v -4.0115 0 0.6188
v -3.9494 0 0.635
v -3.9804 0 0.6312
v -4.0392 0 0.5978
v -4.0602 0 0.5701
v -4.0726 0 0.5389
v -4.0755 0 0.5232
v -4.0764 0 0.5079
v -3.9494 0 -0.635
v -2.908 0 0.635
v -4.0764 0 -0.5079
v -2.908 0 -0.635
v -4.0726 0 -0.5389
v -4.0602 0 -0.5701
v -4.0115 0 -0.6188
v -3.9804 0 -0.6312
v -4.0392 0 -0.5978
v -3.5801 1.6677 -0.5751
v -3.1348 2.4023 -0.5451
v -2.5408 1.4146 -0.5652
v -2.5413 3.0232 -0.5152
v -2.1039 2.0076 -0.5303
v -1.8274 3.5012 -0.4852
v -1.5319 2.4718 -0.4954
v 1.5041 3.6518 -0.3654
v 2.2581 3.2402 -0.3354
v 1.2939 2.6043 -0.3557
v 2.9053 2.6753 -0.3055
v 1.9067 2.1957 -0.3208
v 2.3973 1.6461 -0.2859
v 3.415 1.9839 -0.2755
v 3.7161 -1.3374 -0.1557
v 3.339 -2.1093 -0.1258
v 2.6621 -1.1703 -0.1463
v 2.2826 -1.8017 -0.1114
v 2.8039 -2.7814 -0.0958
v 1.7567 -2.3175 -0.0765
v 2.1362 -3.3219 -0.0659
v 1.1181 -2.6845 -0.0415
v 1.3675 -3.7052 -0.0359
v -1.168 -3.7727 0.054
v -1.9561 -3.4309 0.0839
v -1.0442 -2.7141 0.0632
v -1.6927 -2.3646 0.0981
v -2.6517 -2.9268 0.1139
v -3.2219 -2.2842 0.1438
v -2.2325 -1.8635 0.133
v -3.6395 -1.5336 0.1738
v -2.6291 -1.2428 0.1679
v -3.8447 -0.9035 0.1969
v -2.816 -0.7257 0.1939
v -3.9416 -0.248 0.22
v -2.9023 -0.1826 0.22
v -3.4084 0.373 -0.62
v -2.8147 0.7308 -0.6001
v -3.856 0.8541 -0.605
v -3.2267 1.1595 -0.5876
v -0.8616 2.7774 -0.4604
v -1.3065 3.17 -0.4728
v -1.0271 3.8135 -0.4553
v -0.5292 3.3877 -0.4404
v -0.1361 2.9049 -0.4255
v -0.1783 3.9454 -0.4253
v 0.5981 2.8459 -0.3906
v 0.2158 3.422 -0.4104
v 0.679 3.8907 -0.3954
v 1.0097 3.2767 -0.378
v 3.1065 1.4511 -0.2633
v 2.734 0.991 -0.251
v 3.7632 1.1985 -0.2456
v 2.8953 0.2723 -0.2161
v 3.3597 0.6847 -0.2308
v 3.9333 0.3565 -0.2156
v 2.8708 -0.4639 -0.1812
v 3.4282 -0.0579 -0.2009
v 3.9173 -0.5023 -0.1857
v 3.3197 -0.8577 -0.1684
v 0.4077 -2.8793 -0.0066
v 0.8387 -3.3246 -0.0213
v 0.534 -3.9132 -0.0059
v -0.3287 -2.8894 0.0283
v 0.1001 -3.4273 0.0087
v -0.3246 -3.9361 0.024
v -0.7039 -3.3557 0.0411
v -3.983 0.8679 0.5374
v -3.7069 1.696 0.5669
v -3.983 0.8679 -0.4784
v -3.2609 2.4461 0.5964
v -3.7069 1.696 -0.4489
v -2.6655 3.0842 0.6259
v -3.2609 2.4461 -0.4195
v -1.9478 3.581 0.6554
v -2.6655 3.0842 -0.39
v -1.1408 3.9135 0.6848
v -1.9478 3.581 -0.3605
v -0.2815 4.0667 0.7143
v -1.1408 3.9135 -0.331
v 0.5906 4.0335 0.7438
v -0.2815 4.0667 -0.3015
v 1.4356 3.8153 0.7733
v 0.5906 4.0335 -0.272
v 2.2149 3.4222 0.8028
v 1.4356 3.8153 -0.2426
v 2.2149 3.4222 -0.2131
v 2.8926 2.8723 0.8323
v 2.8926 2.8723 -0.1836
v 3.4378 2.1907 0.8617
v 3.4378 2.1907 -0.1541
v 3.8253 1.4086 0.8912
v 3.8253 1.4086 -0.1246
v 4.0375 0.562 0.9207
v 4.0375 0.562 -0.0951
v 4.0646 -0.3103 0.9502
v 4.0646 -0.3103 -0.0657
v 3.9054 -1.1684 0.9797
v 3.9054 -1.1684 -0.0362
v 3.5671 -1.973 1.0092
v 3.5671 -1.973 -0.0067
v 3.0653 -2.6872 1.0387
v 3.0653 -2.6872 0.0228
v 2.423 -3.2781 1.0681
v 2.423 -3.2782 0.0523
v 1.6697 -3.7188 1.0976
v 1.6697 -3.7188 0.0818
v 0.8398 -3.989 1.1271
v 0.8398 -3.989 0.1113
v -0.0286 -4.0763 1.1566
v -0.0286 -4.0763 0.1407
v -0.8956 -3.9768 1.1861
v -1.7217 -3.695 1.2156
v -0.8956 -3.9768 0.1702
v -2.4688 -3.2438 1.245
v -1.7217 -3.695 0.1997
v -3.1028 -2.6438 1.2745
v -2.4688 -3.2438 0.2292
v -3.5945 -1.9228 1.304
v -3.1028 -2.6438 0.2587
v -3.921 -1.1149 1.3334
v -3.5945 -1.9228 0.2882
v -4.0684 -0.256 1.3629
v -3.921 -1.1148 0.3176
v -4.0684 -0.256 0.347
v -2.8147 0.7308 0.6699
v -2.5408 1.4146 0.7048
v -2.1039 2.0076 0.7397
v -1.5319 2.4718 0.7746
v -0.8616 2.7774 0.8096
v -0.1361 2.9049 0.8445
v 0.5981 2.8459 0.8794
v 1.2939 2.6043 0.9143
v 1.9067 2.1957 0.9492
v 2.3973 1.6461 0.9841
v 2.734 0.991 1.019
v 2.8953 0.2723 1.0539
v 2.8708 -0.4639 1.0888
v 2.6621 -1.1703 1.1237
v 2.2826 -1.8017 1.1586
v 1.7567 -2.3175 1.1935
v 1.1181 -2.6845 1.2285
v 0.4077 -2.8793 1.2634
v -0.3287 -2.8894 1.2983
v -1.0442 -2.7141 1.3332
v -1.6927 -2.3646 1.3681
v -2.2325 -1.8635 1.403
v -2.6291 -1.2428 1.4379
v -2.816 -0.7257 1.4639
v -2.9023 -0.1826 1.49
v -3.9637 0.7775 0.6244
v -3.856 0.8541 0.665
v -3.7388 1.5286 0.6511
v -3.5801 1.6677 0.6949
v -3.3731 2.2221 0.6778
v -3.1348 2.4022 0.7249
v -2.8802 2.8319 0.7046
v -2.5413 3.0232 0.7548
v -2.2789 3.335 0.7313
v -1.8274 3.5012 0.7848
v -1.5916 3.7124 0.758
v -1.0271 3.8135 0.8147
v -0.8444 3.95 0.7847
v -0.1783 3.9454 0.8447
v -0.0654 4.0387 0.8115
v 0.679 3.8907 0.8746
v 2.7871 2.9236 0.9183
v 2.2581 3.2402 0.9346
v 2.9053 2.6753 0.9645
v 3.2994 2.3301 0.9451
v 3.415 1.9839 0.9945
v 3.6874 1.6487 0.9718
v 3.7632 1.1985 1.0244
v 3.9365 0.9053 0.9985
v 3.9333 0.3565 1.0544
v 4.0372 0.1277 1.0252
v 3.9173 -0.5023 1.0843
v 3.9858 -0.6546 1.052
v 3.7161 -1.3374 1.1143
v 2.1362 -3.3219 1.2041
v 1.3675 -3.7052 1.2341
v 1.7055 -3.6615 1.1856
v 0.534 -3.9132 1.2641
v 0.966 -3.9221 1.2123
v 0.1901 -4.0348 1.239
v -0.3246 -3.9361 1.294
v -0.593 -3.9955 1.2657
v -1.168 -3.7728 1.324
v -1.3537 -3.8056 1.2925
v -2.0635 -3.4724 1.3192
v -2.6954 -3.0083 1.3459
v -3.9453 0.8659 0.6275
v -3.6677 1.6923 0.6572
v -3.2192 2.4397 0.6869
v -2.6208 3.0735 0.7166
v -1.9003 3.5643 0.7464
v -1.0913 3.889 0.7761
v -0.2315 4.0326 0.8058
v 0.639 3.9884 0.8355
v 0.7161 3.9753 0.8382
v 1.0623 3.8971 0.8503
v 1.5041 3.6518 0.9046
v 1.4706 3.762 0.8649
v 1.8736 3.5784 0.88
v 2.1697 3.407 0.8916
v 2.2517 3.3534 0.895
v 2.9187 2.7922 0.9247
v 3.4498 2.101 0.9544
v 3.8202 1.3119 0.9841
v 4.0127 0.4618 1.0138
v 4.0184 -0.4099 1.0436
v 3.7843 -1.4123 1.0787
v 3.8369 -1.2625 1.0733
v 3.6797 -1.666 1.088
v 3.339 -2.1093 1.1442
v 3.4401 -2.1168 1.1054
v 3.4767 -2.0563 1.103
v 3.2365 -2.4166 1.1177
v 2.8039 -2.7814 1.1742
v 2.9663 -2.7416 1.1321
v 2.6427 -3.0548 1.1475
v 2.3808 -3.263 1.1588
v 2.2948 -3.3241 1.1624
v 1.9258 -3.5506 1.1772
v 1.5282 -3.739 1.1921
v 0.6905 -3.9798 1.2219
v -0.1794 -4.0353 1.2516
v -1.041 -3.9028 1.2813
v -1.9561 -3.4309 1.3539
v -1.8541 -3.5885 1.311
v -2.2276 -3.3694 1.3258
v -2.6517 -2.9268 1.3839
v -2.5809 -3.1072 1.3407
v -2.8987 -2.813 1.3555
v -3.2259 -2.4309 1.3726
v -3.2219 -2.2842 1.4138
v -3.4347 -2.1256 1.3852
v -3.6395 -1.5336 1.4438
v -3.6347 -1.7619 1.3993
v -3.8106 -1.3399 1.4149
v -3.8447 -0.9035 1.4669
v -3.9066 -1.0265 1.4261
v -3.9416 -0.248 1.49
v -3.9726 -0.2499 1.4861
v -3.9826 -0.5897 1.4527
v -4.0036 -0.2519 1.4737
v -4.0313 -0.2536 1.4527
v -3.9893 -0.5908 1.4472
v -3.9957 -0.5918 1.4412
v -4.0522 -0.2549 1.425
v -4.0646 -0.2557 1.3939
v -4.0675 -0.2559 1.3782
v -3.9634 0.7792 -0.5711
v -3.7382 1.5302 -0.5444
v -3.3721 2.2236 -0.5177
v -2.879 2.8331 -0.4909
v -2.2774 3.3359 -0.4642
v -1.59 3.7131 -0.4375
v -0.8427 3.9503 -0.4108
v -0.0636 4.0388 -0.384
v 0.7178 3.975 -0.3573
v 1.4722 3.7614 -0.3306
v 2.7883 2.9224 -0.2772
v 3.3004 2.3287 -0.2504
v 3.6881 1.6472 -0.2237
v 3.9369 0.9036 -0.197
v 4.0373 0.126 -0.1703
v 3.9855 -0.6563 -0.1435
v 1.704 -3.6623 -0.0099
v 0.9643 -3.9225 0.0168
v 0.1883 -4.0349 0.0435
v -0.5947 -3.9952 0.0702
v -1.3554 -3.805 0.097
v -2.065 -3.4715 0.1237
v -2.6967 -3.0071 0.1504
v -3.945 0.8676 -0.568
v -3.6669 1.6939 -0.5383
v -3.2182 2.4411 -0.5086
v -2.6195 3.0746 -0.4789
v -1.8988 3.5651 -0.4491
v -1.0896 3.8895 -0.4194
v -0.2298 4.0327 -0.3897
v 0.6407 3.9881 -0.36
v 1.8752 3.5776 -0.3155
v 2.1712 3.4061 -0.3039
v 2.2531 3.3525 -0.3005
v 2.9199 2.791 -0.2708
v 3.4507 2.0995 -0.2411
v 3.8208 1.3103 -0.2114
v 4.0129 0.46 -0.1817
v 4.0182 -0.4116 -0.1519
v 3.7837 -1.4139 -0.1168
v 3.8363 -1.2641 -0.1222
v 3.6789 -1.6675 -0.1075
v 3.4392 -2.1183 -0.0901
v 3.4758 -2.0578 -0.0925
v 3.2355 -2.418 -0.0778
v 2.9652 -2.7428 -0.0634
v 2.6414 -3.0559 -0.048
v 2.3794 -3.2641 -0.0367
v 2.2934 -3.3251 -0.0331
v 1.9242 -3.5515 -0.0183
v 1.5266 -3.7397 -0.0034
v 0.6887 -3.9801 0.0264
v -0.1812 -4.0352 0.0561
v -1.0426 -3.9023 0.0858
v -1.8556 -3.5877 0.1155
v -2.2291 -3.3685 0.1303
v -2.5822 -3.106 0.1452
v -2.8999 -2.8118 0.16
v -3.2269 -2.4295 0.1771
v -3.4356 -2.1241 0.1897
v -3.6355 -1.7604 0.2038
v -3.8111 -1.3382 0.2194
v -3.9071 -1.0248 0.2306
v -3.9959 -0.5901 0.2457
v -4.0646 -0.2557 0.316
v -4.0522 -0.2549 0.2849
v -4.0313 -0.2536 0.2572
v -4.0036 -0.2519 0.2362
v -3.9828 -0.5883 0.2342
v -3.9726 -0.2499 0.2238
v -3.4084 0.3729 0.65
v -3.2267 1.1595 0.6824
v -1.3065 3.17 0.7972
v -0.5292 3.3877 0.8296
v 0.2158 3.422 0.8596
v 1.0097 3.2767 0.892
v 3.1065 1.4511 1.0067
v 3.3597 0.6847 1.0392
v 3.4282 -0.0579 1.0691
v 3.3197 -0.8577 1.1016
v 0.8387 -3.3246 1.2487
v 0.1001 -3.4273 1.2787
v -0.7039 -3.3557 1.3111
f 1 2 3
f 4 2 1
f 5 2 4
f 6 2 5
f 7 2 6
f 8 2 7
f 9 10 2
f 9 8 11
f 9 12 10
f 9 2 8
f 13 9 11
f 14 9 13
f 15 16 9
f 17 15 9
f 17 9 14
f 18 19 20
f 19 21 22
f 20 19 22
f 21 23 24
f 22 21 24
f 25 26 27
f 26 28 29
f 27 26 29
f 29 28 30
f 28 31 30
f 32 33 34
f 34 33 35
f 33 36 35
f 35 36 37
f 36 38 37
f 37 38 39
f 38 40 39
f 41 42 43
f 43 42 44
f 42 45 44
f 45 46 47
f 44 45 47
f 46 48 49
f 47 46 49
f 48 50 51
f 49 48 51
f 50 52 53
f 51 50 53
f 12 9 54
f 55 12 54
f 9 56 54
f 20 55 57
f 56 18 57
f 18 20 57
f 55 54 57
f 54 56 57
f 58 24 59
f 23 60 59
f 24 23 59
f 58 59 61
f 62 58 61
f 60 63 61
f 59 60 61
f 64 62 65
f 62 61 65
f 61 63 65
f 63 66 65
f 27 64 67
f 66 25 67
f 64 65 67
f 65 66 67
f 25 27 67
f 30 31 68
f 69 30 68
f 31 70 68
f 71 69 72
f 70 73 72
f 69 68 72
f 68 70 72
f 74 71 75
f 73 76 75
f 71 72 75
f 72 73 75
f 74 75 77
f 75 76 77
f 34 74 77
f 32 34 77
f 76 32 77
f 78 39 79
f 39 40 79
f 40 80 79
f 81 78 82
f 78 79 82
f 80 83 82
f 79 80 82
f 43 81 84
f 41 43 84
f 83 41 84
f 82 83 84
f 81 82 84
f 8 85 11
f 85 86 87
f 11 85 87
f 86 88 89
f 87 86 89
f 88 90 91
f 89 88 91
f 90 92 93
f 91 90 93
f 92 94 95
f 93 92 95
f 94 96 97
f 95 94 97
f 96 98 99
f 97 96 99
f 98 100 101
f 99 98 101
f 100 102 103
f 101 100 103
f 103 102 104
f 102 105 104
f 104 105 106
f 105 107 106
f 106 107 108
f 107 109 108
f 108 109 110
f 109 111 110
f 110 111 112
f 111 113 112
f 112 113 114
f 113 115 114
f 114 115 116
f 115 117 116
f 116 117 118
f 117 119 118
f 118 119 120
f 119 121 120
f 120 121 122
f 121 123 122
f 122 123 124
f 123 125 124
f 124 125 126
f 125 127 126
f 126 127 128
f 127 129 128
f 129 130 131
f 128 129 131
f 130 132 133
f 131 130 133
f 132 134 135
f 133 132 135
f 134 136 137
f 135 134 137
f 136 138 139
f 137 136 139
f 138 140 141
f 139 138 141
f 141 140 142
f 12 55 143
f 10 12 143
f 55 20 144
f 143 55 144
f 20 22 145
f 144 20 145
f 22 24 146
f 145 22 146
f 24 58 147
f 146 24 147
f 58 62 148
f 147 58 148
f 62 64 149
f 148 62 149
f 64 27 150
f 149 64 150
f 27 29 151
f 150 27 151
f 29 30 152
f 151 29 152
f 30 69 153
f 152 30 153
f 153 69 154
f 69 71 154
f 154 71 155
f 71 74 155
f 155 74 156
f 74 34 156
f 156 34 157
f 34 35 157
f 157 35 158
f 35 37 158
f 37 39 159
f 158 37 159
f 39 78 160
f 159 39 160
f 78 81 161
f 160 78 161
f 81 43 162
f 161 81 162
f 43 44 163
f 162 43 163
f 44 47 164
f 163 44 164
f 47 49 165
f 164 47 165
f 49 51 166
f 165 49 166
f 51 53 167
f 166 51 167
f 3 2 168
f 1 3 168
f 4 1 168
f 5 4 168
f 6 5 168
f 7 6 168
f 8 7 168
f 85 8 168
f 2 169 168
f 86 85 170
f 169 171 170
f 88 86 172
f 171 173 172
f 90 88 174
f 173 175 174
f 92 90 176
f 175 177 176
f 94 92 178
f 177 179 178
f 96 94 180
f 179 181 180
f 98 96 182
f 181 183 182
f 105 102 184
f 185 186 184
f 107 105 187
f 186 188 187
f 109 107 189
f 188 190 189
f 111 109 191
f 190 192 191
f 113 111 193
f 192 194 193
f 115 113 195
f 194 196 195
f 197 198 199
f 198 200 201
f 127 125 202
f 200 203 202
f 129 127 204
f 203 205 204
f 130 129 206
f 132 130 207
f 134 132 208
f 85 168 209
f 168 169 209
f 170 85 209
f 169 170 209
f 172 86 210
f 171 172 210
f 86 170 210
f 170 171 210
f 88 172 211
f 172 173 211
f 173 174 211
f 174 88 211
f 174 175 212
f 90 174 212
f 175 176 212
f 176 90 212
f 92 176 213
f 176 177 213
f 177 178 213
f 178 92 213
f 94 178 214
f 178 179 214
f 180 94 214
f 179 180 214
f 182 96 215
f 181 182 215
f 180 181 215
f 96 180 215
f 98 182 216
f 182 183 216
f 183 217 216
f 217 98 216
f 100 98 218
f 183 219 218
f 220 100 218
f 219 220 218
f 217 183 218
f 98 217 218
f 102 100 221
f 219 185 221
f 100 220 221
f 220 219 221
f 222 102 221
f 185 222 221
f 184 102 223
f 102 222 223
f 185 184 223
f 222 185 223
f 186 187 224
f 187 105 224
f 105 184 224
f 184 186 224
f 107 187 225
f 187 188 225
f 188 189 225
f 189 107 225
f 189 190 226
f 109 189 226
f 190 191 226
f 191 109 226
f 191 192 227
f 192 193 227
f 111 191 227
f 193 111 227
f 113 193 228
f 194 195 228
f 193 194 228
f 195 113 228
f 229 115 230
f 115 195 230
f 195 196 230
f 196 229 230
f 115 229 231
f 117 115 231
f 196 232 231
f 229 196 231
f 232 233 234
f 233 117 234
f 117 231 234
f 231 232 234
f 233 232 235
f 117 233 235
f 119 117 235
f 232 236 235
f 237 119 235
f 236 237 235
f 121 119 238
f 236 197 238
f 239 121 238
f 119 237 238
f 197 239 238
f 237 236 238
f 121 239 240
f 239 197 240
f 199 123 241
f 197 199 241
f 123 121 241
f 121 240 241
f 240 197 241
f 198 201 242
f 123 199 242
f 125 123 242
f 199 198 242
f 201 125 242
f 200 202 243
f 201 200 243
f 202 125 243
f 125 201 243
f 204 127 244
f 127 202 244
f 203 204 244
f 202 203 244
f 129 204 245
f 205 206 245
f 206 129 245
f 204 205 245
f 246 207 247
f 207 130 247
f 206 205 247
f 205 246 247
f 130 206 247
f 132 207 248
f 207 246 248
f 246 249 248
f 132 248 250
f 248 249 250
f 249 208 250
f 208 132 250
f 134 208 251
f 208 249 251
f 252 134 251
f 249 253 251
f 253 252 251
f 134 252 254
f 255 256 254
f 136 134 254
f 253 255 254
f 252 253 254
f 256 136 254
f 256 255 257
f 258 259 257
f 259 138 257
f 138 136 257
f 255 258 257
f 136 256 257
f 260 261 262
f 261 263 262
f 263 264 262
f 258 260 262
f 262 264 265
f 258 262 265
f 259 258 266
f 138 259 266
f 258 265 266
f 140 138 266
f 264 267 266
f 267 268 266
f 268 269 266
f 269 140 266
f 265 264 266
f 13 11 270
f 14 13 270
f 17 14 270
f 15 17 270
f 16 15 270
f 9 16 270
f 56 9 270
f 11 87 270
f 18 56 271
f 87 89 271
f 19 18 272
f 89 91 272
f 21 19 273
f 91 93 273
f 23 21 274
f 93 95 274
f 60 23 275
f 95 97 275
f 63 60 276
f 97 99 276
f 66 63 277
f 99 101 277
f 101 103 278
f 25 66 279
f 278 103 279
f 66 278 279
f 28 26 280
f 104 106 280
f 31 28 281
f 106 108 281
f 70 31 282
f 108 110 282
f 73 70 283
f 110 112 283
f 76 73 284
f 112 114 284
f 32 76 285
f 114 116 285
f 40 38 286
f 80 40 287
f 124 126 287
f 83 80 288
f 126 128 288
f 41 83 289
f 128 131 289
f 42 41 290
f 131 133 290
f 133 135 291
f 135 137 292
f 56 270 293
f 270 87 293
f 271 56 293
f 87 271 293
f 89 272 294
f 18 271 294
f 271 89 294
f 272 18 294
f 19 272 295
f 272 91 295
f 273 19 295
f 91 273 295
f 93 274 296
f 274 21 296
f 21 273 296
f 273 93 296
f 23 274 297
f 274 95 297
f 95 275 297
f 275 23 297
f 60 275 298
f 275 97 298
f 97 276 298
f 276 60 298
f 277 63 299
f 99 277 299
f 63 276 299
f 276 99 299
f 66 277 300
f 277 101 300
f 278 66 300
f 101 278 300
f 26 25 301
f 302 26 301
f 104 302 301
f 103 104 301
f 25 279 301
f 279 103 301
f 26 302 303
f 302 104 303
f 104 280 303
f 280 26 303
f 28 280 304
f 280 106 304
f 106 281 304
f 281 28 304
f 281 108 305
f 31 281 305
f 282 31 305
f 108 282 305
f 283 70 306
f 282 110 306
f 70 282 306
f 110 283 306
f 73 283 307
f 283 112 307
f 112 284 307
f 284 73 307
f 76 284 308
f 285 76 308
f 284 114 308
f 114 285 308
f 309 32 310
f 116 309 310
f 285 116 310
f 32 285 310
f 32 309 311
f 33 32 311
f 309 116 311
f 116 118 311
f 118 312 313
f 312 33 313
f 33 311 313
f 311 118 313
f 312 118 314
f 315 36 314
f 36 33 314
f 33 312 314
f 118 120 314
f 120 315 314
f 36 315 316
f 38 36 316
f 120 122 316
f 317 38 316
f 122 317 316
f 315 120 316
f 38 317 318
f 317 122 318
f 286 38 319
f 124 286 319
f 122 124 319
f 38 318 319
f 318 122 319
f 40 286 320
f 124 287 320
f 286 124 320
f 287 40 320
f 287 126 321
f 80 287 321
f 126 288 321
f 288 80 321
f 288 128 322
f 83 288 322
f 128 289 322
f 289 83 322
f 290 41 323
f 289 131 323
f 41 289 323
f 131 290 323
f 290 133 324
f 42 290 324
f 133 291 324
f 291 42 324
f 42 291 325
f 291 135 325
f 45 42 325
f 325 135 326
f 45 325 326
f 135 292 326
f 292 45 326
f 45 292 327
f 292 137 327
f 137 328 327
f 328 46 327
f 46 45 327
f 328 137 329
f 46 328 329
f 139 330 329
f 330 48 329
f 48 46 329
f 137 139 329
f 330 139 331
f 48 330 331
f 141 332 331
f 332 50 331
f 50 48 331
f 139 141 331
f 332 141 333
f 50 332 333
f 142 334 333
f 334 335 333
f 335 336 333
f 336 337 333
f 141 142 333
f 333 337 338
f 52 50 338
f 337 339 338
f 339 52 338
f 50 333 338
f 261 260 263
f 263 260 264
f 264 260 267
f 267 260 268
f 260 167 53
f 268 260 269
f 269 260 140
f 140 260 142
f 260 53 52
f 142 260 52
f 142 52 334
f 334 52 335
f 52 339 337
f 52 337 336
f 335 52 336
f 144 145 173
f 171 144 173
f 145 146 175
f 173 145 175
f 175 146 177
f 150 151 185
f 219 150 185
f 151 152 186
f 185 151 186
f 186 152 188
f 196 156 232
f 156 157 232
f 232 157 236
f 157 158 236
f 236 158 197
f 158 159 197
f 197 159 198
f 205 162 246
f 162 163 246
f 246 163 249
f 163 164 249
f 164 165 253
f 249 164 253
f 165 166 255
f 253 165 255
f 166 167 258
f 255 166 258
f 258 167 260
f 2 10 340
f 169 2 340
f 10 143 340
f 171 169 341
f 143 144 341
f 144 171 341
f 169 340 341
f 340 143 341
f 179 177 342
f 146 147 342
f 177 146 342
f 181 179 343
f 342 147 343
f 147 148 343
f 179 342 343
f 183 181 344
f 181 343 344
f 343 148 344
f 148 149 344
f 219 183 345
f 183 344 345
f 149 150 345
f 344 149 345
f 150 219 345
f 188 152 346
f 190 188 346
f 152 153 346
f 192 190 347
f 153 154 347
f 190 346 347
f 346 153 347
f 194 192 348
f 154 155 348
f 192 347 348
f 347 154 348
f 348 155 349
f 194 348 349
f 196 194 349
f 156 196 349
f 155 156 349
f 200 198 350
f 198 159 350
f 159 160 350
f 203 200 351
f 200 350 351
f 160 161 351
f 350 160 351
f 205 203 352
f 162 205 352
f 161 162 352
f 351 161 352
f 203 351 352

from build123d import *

# Parameters (mm, degrees)
SWEEP3_PITCH       = 0.8636
SWEEP3_HEIGHT      = 0.854964
SWEEP3_RADIUS      = 3.4925
SWEEP3_START_ANGLE = -180
SKETCH2_W          = 1.1684
SKETCH2_H          = 1.27
FILLET1_R          = 0.127


with BuildPart() as part:
    # Sweep3: sweep along a helix
    with BuildLine() as sweep3_path:
        add(Helix(SWEEP3_PITCH, SWEEP3_HEIGHT, SWEEP3_RADIUS, center=(0, 0, 0), direction=(0, 0, 1), lefthand=True, mode=Mode.PRIVATE).rotate(Axis((0, 0, 0), (0, 0, 1)), SWEEP3_START_ANGLE))
    # Sketch2 → Sweep3 (sweep)
    with BuildSketch(Plane(origin=(0, 0, 0), x_dir=(1, 0, 0), z_dir=(0, 1, 0))):
        with Locations((3.492232136, -0.431799383)):
            Rectangle(SKETCH2_W, SKETCH2_H)
    sweep(path=sweep3_path.line, is_frenet=True)

    # Fillet1
    fillet1_edges = [part.edges().sort_by_distance(p)[0] for p in [
        (4.07441676, 0.128043705, -0.207518617),
        (4.07441676, 0.128043705, 1.062481383),
    ]]
    fillet(fillet1_edges, radius=FILLET1_R)


solid = part.part
